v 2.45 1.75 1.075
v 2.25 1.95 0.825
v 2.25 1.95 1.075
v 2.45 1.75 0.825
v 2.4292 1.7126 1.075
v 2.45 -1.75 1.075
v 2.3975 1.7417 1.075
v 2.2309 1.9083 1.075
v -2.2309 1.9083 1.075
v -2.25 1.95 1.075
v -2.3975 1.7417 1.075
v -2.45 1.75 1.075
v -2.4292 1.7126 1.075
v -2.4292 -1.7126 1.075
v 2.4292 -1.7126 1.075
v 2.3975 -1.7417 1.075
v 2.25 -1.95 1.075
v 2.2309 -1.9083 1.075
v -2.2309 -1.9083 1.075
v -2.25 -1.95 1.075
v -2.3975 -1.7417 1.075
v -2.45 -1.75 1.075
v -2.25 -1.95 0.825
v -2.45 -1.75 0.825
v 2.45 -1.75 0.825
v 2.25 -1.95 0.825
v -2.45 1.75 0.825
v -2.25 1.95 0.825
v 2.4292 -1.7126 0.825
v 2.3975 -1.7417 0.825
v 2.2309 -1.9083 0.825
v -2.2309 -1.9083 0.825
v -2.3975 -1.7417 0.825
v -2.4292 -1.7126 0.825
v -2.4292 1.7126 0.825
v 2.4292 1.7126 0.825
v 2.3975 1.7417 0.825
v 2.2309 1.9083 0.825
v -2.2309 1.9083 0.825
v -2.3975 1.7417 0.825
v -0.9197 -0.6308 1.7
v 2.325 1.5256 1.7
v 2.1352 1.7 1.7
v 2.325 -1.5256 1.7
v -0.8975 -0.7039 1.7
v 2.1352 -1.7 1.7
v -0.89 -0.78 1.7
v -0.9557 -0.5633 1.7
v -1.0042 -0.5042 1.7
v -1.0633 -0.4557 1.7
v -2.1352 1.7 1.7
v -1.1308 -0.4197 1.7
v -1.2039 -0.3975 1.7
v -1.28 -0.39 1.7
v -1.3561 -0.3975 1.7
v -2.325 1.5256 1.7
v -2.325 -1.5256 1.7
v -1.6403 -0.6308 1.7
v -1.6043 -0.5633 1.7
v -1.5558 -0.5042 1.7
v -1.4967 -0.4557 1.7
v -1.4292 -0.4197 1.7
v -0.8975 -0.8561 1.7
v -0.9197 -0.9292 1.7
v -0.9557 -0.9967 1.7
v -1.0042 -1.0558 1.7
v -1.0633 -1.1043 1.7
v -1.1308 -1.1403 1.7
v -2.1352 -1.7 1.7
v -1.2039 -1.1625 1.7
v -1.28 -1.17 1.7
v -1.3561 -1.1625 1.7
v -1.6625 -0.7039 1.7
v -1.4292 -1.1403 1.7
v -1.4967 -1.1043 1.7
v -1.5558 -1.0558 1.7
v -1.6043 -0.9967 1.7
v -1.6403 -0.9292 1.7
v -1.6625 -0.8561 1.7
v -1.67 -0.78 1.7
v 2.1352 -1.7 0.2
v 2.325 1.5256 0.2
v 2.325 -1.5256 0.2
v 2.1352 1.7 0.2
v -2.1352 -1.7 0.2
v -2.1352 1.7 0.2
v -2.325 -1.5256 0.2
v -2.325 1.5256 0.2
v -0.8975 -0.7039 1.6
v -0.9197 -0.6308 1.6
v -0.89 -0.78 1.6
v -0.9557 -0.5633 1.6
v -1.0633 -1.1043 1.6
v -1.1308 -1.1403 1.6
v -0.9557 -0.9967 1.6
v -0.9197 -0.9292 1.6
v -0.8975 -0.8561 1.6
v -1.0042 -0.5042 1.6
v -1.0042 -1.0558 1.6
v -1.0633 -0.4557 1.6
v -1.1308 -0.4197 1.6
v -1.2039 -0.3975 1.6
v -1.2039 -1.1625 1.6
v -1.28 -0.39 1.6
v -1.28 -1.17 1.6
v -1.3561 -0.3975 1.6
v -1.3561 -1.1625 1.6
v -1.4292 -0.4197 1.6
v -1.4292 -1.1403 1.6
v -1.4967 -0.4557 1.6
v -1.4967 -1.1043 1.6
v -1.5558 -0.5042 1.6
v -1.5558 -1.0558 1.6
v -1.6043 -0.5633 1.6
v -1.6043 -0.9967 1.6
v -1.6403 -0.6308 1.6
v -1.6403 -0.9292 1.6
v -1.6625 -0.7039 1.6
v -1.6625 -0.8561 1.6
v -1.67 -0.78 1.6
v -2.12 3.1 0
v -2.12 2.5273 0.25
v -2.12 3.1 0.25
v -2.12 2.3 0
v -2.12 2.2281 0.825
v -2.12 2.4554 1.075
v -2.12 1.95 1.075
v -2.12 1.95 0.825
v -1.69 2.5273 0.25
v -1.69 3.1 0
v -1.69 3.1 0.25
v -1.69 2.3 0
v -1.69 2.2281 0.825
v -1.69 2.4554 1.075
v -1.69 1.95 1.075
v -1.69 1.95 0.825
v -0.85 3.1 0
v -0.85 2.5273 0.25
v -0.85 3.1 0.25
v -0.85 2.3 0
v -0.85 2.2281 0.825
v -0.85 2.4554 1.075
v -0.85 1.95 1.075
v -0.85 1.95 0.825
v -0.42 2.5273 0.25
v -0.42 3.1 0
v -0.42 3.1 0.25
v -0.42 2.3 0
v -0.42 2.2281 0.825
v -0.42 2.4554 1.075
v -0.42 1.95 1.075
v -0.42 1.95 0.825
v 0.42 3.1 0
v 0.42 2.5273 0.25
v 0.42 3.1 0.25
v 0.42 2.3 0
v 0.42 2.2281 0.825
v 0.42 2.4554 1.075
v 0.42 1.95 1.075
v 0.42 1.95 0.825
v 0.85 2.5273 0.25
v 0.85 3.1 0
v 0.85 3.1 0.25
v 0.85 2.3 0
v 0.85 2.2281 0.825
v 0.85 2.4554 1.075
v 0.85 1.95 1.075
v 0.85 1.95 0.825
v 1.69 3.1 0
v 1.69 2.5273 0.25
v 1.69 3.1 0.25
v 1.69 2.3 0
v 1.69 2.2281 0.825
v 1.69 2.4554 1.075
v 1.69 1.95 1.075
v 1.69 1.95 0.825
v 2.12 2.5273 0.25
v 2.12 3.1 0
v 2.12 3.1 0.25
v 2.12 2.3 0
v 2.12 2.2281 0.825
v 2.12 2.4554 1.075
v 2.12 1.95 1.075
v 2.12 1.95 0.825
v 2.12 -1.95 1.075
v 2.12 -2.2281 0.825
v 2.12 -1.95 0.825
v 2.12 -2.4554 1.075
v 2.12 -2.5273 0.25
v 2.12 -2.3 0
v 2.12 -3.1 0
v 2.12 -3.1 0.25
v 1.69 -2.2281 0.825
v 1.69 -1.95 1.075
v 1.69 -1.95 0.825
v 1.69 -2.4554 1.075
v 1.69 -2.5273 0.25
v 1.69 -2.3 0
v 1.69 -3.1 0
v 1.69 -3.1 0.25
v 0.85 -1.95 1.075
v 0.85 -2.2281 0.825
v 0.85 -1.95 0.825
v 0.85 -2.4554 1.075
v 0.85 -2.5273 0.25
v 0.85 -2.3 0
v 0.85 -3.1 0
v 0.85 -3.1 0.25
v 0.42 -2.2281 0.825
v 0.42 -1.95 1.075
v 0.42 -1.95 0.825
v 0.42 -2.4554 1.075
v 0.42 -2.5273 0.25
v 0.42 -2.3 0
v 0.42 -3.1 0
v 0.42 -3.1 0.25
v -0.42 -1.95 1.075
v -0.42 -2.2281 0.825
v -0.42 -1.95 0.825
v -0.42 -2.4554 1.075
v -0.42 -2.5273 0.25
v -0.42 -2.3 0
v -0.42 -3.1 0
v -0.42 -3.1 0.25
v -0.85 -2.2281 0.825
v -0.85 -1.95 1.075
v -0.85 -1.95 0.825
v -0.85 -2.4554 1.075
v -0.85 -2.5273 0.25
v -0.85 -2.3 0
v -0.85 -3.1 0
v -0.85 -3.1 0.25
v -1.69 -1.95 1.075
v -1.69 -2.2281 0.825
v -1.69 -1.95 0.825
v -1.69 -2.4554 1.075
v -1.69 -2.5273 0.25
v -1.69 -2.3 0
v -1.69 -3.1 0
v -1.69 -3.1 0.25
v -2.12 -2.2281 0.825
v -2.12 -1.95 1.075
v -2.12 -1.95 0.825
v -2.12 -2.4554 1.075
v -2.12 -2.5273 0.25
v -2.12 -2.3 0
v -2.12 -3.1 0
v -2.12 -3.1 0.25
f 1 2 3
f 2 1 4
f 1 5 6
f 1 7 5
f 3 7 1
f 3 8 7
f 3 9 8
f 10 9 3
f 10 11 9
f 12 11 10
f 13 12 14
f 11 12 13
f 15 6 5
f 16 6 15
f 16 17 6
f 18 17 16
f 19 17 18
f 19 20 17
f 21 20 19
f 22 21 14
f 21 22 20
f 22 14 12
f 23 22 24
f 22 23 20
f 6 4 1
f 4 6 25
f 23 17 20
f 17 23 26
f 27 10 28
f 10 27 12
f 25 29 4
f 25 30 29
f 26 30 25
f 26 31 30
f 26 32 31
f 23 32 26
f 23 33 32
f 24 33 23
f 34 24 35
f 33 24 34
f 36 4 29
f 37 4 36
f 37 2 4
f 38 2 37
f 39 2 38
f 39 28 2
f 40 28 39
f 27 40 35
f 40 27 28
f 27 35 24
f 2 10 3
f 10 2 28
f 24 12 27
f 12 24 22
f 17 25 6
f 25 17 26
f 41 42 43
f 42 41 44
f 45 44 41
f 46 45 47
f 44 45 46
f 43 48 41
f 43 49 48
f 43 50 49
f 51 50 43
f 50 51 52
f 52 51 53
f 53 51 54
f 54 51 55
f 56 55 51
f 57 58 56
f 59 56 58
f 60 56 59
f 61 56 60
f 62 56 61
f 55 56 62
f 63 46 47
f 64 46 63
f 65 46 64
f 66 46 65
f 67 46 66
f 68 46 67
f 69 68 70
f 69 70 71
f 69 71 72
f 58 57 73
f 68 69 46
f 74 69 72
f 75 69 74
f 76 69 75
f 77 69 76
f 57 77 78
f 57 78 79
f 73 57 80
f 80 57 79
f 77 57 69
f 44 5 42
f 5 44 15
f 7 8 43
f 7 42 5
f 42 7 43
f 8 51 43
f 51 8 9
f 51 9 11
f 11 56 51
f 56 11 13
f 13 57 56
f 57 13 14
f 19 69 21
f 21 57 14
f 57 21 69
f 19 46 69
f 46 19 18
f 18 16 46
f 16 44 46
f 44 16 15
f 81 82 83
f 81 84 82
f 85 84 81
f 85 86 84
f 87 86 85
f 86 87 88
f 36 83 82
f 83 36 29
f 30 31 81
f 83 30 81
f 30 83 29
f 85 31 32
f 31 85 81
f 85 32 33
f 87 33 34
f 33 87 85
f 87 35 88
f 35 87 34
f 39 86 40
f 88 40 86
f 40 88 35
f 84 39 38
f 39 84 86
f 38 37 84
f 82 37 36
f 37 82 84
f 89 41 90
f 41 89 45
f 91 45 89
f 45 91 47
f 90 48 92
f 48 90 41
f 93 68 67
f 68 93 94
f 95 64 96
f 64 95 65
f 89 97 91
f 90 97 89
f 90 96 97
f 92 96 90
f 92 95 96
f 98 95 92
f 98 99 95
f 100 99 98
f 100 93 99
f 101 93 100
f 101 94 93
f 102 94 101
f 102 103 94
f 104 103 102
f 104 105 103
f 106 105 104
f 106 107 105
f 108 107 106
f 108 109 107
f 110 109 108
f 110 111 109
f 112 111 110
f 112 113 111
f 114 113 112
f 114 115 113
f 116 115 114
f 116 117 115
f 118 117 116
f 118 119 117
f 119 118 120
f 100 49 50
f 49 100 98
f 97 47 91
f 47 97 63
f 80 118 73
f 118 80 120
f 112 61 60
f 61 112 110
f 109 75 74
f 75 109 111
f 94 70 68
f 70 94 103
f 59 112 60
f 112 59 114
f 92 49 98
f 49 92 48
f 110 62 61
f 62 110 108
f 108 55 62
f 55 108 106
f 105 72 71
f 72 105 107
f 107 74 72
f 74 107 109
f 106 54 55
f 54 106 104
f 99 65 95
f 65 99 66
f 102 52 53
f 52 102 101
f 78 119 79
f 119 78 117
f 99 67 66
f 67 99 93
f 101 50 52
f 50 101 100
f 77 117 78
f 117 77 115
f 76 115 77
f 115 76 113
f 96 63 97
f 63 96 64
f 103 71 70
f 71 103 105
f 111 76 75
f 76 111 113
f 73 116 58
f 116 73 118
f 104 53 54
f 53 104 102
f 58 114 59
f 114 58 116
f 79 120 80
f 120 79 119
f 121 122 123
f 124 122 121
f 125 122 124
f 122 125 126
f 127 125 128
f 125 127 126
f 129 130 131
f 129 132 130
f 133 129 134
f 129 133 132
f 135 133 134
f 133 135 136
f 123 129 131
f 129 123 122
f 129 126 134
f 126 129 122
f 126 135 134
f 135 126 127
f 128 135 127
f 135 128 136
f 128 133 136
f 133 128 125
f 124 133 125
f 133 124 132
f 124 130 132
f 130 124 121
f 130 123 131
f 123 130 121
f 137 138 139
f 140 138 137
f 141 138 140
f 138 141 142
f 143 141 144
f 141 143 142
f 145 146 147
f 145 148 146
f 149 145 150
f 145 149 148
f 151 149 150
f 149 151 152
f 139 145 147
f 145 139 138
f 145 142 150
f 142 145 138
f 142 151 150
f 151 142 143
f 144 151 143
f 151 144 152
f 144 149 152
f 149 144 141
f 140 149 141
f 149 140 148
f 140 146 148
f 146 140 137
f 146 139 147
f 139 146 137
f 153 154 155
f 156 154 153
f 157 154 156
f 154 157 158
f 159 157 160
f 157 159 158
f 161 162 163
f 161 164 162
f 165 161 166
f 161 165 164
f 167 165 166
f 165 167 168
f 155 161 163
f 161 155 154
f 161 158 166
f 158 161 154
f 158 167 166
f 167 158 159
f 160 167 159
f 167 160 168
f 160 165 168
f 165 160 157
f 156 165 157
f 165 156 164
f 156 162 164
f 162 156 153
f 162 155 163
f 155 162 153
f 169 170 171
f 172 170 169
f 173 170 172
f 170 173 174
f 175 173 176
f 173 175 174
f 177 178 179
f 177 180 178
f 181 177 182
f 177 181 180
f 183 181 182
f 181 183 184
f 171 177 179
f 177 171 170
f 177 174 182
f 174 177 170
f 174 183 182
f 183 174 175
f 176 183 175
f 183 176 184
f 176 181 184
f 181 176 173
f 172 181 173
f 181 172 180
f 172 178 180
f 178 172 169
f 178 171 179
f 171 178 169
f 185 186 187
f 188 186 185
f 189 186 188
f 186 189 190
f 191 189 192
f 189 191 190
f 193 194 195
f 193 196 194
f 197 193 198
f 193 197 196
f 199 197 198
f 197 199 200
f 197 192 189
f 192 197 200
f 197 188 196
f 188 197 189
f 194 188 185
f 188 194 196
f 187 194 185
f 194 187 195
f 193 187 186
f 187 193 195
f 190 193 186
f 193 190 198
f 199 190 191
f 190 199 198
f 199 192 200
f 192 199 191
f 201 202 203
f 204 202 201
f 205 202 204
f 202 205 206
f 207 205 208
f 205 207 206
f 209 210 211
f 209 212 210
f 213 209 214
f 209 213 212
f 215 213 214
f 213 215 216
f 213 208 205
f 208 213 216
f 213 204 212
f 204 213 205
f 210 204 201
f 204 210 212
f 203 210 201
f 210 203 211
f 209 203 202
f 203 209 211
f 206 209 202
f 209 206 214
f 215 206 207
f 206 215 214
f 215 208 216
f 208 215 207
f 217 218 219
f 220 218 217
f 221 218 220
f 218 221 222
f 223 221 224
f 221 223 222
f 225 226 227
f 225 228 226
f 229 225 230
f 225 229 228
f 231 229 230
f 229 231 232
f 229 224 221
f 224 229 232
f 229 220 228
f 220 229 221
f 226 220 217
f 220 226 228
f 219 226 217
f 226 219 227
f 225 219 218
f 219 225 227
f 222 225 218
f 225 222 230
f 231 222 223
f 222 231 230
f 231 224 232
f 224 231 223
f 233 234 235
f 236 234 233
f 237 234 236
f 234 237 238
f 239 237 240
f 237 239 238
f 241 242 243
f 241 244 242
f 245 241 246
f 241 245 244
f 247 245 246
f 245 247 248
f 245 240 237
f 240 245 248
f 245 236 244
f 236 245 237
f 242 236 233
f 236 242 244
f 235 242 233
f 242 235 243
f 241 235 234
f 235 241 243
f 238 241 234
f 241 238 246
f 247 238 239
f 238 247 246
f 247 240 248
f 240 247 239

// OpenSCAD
pins = 8;
pin_pitch = 1.27;
pin_width = 0.43;
pin_seating = 0.8;
pin_gull_angle = 5;
leadframe_thickness = 0.25;

overall_width = 6.2;
body_width = 3.9;
body_length = 4.9;
body_thickness = 1.5;

total_thickness = 1.7;

body_length_bevel = 0.25;
body_width_bevel = 0.5;
body_chamfer = 0.2;


leadframe_height = total_thickness - body_thickness/2;

index_mark_offset = min(min(body_width, body_length) * 0.3, 1.5);
index_mark_radius = min(index_mark_offset / 3, 0.5);


difference() {
    body();
    color("#ddd") translate([
        -body_length / 2 + index_mark_offset,
        -body_width / 2 + index_mark_offset,
        total_thickness - 0.1,
    ]) cylinder(h = 10, r = index_mark_radius, $fn=32);
}


translate([pin_pitch * ((pins / 2) - 1) / -2, overall_width / 2, 0]) for(n = [0 : pins / 2 - 1]) {
    translate([pin_pitch * n, 0, 0]) pin();
}
rotate([0, 0, 180]) translate([pin_pitch * ((pins / 2) - 1) / -2, overall_width / 2, 0]) for(n = [0 : pins / 2 - 1]) {
    translate([pin_pitch * n, 0, 0]) pin();
}


module pin() {
    color("#999") rotate([90, 0, 90]) linear_extrude(height = pin_width, center = true) {
        gull_offset = leadframe_height - leadframe_thickness / 2;
        pin_length = (overall_width - body_width) / 2;
        sine = sin(pin_gull_angle);
        cosine = cos(pin_gull_angle);
        polygon([
            [0, 0],
            [-pin_seating, 0],
            [-pin_seating - sine * gull_offset, gull_offset],
            [-pin_length, gull_offset],
            [-pin_length, gull_offset + leadframe_thickness],
            [-pin_seating - sine * (gull_offset + leadframe_thickness) + cosine * leadframe_thickness, gull_offset + leadframe_thickness],
            [-pin_seating - sine * leadframe_thickness + cosine * leadframe_thickness, leadframe_thickness],
            [0, leadframe_thickness],
        ]);
    }
}


module body() {
    color("#555") translate([0, 0, leadframe_height]) {
        linear_extrude(height = leadframe_thickness, center = true) body_outline();
        linear_extrude(
            height = body_thickness / 2,
            scale = [(body_length - body_length_bevel) / body_length, (body_width - body_width_bevel) / body_width]
        ) body_outline();
        
        rotate([180, 0, 0]) linear_extrude(
            height = body_thickness / 2,
            scale = [(body_length - body_length_bevel) / body_length, (body_width - body_width_bevel) / body_width]
        ) body_outline();
    }
}
module body_outline() {
    polygon([
        [ -body_length/2 + body_chamfer, -body_width/2 ],
        [ -body_length/2               , -body_width/2 + body_chamfer ],
        [ -body_length/2               , +body_width/2 - body_chamfer ],
        [ -body_length/2 + body_chamfer, +body_width/2 ],
        [ +body_length/2 - body_chamfer, +body_width/2 ],
        [ +body_length/2               , +body_width/2 - body_chamfer ],
        [ +body_length/2               , -body_width/2 + body_chamfer ],
        [ +body_length/2 - body_chamfer, -body_width/2 ],
    ]);
}
